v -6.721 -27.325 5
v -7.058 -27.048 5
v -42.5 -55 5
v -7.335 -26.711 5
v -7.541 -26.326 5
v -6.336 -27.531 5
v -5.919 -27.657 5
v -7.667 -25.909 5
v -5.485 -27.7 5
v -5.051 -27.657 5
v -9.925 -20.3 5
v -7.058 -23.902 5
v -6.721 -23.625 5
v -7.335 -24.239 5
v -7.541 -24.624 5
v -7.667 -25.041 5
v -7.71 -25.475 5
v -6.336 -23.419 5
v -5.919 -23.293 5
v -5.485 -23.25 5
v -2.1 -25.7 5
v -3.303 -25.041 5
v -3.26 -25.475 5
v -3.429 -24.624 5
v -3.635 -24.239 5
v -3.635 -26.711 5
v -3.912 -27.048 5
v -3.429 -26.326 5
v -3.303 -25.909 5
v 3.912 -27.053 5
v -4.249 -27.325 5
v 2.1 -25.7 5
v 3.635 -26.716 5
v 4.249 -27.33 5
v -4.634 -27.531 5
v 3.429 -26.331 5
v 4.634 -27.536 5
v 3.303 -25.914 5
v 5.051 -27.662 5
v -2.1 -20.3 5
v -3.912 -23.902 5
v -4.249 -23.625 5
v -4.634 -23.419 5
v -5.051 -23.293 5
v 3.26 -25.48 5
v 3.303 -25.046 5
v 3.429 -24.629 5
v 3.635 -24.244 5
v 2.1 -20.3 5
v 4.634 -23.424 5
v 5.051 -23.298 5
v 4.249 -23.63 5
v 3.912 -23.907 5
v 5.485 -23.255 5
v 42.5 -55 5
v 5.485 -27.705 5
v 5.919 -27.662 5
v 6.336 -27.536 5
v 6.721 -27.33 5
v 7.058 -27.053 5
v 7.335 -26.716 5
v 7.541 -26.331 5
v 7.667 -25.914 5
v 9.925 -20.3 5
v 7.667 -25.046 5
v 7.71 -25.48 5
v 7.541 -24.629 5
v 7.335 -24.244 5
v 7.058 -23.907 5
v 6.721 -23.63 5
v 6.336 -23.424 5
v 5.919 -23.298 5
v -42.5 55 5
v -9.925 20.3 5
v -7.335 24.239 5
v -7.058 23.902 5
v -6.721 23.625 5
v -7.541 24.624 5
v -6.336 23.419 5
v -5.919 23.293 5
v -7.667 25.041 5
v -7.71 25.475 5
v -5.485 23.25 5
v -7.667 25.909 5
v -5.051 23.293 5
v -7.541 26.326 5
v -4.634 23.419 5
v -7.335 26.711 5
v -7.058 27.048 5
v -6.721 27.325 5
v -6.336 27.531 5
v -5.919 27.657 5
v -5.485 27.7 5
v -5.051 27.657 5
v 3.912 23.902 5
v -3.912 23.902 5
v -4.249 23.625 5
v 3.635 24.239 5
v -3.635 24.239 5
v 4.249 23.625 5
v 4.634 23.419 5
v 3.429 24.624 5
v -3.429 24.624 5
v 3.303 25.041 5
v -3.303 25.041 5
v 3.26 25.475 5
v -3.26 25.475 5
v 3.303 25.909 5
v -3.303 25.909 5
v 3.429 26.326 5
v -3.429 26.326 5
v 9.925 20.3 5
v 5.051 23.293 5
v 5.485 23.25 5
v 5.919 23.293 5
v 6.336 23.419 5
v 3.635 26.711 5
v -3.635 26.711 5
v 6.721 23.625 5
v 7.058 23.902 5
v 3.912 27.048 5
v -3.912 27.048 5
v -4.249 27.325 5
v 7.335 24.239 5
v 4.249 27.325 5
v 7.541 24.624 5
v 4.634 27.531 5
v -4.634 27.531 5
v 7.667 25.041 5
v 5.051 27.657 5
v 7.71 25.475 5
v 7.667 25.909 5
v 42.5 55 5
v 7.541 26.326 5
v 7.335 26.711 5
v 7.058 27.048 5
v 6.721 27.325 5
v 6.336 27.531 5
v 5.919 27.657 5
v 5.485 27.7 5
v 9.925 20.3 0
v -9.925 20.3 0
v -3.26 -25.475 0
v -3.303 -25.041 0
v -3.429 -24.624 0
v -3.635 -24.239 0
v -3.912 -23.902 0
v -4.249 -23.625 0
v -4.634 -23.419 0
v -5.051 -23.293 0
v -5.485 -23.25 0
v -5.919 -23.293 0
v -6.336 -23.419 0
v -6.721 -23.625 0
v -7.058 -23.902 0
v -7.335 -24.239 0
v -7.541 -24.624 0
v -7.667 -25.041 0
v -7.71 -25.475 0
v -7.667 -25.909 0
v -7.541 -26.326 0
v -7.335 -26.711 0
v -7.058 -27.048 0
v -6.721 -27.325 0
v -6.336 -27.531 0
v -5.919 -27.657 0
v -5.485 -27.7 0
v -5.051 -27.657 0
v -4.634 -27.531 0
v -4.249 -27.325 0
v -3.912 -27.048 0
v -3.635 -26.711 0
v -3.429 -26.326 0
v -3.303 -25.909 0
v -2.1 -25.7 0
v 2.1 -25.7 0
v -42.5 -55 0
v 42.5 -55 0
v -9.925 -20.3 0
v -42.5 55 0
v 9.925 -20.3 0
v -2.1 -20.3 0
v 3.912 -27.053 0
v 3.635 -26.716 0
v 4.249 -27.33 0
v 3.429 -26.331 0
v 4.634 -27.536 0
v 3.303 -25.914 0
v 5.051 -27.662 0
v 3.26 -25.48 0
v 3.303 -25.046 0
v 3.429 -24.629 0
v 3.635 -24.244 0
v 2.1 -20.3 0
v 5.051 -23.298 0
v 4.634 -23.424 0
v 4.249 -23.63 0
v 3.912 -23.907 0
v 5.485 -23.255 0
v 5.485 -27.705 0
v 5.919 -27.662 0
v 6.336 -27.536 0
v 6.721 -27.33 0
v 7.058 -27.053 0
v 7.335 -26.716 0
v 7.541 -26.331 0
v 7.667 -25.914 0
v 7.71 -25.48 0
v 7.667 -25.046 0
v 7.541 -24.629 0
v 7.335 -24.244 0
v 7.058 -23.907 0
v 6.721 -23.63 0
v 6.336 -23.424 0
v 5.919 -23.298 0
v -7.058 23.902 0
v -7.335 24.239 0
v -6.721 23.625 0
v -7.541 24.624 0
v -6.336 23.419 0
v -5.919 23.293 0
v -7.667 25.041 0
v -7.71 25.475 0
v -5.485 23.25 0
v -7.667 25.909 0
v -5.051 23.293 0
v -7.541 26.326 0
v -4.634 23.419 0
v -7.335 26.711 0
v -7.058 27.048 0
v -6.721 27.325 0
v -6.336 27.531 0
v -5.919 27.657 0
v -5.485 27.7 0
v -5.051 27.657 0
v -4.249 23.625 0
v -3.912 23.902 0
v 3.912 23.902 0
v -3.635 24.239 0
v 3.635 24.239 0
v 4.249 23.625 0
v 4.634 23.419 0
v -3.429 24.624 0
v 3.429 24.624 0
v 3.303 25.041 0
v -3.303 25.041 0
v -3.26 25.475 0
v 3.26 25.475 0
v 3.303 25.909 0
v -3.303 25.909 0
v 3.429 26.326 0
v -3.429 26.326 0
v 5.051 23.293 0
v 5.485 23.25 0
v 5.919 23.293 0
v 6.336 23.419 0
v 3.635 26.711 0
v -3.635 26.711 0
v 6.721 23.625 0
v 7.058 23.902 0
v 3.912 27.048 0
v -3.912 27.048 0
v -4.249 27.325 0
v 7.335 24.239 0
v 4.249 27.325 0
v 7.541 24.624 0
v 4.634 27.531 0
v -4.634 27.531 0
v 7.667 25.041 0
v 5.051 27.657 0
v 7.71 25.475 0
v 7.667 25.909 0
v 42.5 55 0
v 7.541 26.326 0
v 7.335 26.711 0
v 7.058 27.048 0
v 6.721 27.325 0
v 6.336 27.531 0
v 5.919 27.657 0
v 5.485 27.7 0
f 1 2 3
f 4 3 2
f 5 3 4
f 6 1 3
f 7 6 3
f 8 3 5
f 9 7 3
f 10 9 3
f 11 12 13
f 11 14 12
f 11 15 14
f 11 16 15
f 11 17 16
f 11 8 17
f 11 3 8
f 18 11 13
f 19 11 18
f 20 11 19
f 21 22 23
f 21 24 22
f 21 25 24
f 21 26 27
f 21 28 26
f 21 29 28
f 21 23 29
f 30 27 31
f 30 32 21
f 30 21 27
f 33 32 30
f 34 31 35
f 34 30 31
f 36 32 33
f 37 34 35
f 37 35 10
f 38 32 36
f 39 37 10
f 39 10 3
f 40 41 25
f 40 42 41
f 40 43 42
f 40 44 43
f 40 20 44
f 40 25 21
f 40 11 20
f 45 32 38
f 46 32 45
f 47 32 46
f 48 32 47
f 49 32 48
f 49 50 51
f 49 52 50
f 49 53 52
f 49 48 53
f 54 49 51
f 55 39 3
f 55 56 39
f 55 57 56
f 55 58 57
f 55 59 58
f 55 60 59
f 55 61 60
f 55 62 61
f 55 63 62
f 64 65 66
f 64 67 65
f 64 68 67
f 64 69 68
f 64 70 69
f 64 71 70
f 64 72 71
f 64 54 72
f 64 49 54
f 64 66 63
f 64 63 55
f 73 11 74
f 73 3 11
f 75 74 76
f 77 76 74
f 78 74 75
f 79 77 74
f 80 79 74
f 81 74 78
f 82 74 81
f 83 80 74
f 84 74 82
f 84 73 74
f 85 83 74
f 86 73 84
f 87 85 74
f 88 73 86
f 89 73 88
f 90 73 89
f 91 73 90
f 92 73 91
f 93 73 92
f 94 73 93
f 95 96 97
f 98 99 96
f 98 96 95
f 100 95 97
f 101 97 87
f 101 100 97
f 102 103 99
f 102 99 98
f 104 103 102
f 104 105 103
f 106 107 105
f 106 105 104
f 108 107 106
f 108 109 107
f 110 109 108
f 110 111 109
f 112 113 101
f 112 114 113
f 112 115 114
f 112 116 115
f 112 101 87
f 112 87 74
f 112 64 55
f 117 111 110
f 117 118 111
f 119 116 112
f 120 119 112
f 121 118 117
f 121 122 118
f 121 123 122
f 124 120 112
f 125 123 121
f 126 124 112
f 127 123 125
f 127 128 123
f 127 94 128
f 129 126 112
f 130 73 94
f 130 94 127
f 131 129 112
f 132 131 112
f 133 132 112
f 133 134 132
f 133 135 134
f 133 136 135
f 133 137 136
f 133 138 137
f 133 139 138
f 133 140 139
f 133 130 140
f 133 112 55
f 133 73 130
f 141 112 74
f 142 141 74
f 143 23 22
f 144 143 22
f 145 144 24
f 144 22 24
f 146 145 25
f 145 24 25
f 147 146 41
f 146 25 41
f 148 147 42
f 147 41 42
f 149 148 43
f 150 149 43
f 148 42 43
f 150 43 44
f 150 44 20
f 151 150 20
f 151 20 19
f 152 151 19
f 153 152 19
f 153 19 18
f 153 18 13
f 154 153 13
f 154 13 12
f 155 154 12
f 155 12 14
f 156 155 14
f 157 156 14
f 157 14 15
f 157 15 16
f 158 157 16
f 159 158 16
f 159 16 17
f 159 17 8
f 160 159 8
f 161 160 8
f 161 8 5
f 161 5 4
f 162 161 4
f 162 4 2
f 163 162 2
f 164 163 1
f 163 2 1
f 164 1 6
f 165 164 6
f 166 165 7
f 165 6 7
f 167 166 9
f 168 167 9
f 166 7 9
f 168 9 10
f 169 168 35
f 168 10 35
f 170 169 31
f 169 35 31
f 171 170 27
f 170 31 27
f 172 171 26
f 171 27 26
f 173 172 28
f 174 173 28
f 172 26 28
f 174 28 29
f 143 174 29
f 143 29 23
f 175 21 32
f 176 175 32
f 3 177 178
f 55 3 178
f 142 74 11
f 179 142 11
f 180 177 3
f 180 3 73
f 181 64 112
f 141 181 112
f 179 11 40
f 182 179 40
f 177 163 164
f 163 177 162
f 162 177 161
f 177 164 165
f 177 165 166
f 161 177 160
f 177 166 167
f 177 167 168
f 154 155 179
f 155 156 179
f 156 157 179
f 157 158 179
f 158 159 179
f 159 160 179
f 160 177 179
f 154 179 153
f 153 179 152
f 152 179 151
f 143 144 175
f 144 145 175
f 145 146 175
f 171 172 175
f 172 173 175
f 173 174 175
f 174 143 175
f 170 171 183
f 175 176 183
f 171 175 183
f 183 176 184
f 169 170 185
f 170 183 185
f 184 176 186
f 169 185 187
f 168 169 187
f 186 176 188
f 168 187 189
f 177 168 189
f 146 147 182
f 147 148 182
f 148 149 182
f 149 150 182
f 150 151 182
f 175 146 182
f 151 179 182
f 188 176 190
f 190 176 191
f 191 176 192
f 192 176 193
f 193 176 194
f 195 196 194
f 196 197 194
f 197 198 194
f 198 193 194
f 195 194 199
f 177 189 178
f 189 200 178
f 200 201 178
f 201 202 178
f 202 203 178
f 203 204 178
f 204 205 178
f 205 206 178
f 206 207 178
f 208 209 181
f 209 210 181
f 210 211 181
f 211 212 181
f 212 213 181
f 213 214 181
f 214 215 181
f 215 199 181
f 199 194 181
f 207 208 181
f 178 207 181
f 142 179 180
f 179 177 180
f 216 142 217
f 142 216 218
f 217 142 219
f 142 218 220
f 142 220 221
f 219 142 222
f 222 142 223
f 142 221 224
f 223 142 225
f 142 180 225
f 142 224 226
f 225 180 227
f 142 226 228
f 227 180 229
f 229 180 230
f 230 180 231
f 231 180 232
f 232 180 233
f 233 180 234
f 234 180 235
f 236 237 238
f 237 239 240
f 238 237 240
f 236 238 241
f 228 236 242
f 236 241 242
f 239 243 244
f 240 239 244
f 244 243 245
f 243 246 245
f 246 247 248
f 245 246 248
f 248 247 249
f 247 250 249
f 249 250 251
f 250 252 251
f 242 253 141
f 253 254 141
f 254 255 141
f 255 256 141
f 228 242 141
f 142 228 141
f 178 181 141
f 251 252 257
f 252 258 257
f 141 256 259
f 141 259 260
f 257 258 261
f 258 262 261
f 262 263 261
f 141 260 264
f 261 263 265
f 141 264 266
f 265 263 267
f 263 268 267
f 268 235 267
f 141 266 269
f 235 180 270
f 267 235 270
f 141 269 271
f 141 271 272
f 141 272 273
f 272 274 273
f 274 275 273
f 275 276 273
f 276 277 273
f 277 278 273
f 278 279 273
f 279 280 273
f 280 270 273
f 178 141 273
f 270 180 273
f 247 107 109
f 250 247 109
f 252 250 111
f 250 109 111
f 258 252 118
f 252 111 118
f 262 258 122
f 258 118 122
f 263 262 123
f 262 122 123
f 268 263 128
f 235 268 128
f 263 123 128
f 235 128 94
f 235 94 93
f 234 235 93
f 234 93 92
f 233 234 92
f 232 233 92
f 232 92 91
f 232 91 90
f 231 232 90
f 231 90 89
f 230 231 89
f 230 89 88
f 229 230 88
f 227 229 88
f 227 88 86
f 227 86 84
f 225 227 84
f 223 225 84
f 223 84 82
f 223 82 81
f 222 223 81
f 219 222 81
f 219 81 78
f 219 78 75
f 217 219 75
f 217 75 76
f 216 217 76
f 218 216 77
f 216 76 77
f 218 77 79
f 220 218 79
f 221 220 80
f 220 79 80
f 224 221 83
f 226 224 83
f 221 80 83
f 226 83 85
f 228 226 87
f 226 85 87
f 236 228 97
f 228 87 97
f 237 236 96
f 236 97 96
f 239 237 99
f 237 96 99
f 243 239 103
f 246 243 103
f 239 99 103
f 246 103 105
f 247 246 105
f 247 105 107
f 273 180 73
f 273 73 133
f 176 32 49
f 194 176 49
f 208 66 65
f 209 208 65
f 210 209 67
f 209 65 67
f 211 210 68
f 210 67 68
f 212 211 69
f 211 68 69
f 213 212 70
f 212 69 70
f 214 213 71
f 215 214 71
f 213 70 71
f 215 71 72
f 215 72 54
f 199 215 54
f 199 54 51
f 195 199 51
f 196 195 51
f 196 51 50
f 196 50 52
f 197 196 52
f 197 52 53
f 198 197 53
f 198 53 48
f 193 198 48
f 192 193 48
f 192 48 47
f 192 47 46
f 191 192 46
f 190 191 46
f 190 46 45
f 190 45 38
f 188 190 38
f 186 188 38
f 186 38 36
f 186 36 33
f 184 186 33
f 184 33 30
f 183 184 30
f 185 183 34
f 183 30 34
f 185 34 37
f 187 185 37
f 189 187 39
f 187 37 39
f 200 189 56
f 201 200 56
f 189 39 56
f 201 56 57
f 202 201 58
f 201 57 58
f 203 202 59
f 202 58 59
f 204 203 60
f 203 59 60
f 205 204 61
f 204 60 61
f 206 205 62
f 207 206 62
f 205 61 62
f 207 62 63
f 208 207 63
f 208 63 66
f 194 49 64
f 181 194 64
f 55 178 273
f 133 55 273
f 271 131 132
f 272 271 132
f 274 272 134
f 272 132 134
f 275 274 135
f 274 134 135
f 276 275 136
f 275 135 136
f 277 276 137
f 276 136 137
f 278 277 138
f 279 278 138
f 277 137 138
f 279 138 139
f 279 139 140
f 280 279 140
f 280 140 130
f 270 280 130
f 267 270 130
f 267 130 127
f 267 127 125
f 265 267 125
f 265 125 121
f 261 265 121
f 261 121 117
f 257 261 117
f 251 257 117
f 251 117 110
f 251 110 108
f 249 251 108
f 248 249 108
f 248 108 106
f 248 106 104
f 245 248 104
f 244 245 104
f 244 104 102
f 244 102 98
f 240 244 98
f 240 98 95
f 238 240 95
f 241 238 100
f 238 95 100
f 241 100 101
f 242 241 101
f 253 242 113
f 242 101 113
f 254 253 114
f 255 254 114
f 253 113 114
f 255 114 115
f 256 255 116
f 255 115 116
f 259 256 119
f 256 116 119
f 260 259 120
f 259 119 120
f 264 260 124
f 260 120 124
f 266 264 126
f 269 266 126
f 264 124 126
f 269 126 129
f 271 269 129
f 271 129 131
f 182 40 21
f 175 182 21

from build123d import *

# Parameters (mm, degrees)
F0_W     = 85
F0_H     = 110
F1_DEPTH = 5
F3_DEPTH = 25
F4_R     = 2.225
F5_DEPTH = 25


with BuildPart() as f1:
    # F0 (on Top) → F1 (new body)
    with BuildSketch(Plane.XY):
        Rectangle(F0_W, F0_H)
    extrude(amount=F1_DEPTH)

    # F2 (on face) → F3 (cut)
    with BuildSketch(Plane.XY.offset(5)):
        Polygon((9.925, -20.3), (9.925, 20.3), (-9.925, 20.3), (-9.925, -20.3), (-2.1, -20.3), (-2.1, -25.7), (2.1, -25.7), (2.1, -20.3), align=None)
    extrude(amount=-F3_DEPTH, mode=Mode.SUBTRACT)

    # F4 (on face) → F5 (cut)
    with BuildSketch(Plane.XY.offset(5)):
        with Locations((-5.485, 25.475)):
            Circle(F4_R)
        with Locations((5.485, 25.475)):
            Circle(F4_R)
        with Locations((-5.485, -25.475)):
            Circle(F4_R)
        with Locations((5.485, -25.48)):
            Circle(F4_R)
    extrude(amount=-F5_DEPTH, mode=Mode.SUBTRACT)


solid = f1.part
